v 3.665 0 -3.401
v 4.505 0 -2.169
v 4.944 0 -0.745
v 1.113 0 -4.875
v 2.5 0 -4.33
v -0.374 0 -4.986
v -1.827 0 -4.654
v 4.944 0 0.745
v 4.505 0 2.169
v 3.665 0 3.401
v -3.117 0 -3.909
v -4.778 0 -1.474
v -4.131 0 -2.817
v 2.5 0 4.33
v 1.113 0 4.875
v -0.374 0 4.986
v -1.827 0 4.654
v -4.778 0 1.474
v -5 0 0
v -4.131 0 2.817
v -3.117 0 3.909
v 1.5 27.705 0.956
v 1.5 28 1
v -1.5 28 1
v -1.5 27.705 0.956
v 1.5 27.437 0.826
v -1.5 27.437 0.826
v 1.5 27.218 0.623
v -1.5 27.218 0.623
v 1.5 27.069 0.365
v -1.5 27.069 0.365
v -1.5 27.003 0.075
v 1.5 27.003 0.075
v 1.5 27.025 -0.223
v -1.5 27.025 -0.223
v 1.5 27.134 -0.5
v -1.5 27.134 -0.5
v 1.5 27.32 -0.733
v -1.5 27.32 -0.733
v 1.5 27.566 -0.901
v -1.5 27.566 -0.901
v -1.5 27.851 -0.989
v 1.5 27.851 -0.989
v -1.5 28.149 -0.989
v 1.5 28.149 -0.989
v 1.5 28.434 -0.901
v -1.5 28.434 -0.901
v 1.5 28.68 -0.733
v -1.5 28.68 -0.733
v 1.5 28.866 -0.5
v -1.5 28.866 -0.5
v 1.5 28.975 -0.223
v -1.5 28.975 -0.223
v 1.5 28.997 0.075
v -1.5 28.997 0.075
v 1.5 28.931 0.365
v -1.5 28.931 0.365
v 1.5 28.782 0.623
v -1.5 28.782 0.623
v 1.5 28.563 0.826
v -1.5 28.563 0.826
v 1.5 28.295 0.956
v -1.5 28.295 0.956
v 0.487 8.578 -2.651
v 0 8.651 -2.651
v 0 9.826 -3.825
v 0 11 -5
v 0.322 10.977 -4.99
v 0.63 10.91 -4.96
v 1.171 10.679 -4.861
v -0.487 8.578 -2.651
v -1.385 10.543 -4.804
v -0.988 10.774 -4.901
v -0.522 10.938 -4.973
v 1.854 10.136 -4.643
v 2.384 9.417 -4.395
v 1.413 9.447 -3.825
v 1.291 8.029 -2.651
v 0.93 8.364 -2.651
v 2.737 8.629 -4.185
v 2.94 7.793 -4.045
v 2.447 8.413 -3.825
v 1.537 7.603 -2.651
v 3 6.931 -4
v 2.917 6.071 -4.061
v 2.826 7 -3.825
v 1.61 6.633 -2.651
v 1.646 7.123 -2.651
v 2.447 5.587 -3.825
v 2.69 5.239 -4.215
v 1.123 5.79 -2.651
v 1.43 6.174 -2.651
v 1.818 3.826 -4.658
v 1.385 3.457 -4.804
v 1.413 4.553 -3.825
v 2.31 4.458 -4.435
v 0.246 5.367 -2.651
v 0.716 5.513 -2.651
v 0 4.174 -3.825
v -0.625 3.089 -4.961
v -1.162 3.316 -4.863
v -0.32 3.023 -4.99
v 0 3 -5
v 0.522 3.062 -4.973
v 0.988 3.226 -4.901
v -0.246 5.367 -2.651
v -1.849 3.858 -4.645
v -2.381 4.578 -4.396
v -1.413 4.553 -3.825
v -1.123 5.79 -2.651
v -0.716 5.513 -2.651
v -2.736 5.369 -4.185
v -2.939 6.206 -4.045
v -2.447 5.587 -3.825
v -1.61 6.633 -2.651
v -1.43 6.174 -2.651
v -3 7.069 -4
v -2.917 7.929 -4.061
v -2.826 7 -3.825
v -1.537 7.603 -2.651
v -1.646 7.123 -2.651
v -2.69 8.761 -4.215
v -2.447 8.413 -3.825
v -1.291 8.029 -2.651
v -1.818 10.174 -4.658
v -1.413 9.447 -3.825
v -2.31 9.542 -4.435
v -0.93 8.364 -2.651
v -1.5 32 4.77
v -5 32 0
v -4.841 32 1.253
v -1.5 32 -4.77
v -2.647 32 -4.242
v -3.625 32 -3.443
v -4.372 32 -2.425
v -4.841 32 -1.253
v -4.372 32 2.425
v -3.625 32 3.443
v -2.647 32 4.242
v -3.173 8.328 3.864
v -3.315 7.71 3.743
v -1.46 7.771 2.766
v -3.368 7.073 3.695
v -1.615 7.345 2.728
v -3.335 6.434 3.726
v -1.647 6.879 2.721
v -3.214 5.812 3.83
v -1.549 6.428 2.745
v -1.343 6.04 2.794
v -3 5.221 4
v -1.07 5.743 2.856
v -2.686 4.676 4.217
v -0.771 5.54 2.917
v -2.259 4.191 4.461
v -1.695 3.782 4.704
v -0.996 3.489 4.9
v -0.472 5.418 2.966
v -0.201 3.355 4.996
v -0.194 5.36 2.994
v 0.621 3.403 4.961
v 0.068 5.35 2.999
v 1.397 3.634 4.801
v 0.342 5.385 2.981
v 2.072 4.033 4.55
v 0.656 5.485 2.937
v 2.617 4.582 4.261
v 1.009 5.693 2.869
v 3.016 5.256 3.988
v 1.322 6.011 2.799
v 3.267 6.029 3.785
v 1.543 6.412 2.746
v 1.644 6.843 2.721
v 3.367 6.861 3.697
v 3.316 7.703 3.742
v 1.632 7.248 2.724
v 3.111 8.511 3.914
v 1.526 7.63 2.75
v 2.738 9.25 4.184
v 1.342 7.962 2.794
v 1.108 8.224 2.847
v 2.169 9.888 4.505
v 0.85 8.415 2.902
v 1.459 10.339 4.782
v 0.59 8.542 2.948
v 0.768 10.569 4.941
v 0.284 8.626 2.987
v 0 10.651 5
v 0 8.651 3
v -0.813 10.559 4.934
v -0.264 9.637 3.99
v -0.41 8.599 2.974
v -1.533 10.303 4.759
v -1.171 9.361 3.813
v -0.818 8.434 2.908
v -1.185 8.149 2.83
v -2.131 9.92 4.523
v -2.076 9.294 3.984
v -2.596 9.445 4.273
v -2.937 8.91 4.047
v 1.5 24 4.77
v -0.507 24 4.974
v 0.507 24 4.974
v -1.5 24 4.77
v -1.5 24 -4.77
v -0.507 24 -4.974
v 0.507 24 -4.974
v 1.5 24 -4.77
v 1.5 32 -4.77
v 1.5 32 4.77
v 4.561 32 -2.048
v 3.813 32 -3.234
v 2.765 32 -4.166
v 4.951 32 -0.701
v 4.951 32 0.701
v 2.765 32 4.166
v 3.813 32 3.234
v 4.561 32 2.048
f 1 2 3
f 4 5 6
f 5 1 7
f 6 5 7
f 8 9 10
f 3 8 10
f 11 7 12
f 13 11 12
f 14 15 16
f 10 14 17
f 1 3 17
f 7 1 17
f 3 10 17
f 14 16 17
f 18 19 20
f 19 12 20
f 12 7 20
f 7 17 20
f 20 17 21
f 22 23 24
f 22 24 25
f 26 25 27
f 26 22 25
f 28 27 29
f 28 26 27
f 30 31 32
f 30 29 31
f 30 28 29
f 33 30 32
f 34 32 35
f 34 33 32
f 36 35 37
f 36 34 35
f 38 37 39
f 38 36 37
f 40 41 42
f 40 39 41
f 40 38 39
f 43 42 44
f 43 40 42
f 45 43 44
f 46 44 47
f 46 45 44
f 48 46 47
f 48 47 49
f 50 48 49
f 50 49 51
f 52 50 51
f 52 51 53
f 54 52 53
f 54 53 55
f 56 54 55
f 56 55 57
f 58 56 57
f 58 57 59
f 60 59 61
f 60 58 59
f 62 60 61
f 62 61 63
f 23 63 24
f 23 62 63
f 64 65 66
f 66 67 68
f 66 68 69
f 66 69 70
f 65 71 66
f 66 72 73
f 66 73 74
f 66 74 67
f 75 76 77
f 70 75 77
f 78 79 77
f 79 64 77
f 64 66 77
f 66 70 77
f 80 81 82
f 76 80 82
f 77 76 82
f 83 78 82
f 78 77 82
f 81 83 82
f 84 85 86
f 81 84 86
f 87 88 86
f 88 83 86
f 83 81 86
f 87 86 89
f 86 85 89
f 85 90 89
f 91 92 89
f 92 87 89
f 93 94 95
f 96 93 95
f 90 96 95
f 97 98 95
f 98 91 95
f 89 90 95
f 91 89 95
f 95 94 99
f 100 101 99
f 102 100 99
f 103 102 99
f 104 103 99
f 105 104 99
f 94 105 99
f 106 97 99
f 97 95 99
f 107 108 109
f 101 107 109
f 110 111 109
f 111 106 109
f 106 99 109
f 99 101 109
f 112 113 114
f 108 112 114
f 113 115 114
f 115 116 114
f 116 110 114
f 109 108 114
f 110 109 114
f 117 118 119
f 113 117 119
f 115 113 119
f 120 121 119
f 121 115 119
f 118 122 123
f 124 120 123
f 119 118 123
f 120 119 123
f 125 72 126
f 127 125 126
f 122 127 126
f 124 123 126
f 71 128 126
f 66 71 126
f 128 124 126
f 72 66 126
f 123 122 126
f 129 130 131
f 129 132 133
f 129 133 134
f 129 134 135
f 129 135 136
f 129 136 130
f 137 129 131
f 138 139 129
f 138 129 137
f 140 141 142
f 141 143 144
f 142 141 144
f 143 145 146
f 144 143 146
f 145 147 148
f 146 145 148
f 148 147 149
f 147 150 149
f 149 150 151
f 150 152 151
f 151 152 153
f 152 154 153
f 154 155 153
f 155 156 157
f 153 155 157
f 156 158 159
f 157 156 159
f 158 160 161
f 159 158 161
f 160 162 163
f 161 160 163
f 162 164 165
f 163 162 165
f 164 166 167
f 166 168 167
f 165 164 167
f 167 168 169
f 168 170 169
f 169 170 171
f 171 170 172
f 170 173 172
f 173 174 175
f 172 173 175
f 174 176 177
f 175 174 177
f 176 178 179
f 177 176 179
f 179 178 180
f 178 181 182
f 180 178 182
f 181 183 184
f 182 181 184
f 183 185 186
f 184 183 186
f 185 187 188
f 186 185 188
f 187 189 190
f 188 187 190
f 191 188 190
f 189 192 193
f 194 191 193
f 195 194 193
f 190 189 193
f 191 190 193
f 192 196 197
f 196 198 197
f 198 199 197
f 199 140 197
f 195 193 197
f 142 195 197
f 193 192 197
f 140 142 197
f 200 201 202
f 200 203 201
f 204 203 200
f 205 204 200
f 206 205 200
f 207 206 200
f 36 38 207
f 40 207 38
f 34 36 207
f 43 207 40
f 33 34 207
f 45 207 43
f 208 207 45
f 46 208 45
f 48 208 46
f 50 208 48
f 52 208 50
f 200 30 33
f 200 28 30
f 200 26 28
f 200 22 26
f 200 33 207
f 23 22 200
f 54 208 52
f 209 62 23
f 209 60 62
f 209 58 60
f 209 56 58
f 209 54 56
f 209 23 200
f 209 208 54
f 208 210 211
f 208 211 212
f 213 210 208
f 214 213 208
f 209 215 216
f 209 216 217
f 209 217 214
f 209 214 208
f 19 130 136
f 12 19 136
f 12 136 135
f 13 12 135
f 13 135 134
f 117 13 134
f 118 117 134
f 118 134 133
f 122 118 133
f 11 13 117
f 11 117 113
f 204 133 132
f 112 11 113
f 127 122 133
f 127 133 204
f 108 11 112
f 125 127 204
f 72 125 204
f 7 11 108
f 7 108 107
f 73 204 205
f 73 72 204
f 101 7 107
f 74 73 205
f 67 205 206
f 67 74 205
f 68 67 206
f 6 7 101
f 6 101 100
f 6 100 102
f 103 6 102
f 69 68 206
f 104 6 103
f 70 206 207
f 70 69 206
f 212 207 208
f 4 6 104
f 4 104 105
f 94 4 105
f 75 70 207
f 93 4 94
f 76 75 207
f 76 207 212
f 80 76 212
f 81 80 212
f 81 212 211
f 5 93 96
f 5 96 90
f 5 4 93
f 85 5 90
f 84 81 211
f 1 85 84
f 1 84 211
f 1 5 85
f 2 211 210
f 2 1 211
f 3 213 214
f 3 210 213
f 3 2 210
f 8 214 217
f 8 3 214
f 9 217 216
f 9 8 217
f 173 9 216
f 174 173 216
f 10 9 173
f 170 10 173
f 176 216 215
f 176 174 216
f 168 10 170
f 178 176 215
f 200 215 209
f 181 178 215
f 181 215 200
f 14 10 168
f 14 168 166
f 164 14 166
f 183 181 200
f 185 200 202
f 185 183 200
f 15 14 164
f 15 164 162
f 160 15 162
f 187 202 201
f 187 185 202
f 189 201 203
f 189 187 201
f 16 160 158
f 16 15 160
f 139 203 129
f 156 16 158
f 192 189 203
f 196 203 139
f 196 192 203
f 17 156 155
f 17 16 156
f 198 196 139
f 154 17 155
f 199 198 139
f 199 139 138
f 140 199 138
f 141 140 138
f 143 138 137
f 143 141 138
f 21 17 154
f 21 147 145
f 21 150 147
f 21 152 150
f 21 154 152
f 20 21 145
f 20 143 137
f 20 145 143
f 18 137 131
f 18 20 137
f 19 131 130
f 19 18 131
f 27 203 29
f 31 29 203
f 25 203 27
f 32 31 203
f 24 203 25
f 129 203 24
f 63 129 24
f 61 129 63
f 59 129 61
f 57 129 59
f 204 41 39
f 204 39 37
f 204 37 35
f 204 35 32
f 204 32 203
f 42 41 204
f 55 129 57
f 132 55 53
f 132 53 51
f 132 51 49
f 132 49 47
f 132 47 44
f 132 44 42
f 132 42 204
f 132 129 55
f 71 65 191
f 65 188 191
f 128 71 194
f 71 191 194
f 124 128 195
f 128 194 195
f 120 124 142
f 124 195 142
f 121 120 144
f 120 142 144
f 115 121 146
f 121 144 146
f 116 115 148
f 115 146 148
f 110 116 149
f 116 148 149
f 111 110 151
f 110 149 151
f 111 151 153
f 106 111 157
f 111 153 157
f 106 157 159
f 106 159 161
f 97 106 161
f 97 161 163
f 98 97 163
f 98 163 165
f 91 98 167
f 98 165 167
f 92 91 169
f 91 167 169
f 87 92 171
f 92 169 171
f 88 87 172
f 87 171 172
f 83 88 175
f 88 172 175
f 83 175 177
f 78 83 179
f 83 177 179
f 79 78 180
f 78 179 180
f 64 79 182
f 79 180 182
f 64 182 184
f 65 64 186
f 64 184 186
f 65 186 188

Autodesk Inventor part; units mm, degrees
ref_plane "YZ Plane" through (0, 0, 0) normal (1, 0, 0) x (0, 1, 0)
ref_plane "XZ Plane" through (0, 0, 0) normal (0, 1, 0) x (-1, 0, 0)
sketch "Sketch1" plane through (0, 0, 0) normal (0, 1, 0) x (-1, 0, 0)
  circle A0 centre (0, 0) radius 5
  dimension "d0" = 10
extrude "Extrusion1" add sketch "Sketch1" along normal blind 32
sketch "Sketch2" plane through (0, 32, 0) normal (0, 1, 0) x (1, 0, 0)
  line L0 (-1.5, 5) -> (1.5, 5)
  line L1 (1.5, 5) -> (1.5, -5)
  line L2 (1.5, -5) -> (-1.5, -5)
  line L3 (-1.5, -5) -> (-1.5, 5)
  point P0 (0, 0)
  point P1 (-1.5, 0)
  point P2 (0, 5)
  dimension "d3" = 3
  dimension "d4" = 10
extrude "Extrusion2" cut sketch "Sketch2" against normal blind 8
sketch "Sketch3" plane through (1.5, 32, -4.7697) normal (-1, 0, 0) x (0, 0, 1)
  circle A0 centre (4.7697, -4) radius 1
  line L0 (9.5394, 0) -> (0, 0) projected
  point P0 (4.7697, -32)
  point P1 (4.7697, 0)
  dimension "d7" = 2
  dimension "d8" = 4
extrude "Extrusion3" add sketch "Sketch3" along normal blind 3
ref_plane "Work Plane1" through (0, 0, -5) normal (0, 0, 1) x (1, 0, 0)
sketch "Sketch5" plane through (0, 0, -5) normal (0, 0, 1) x (1, 0, 0)
  point P0 (0, 0)
  point P1 (0, 7)
  dimension "d14" = 7
hole "Hole1" at (0, 7, -5) direction (0, 0, 1) diameter 3.302 end through all countersink diameter 8 countersink angle 90 thread size "8-32 UNC" class "2B" standard "ANSI Unified Screw Threads"
chamfer "Chamfer1" distance 2 angle 45 1 edges at (-0.2563, 5.369, 4.9934)
equation "\"d20\" = Thickness"
equation "\"BendRadius\" = Thickness"
equation "\"BendReliefWidth\" = Thickness"
equation "\"BendReliefDepth\" = 0.5 * Thickness"
equation "\"CornerReliefSize\" = 4 * Thickness"
equation "\"MinimumRemnant\" = 2 * Thickness"
equation "\"TransitionRadius\" = BendRadius"
equation "\"GapSize\" = Thickness"
equation "\"Thickness\" = 3.048"
properties part number "barrel_hinge-female" material "Stainless Steel"
